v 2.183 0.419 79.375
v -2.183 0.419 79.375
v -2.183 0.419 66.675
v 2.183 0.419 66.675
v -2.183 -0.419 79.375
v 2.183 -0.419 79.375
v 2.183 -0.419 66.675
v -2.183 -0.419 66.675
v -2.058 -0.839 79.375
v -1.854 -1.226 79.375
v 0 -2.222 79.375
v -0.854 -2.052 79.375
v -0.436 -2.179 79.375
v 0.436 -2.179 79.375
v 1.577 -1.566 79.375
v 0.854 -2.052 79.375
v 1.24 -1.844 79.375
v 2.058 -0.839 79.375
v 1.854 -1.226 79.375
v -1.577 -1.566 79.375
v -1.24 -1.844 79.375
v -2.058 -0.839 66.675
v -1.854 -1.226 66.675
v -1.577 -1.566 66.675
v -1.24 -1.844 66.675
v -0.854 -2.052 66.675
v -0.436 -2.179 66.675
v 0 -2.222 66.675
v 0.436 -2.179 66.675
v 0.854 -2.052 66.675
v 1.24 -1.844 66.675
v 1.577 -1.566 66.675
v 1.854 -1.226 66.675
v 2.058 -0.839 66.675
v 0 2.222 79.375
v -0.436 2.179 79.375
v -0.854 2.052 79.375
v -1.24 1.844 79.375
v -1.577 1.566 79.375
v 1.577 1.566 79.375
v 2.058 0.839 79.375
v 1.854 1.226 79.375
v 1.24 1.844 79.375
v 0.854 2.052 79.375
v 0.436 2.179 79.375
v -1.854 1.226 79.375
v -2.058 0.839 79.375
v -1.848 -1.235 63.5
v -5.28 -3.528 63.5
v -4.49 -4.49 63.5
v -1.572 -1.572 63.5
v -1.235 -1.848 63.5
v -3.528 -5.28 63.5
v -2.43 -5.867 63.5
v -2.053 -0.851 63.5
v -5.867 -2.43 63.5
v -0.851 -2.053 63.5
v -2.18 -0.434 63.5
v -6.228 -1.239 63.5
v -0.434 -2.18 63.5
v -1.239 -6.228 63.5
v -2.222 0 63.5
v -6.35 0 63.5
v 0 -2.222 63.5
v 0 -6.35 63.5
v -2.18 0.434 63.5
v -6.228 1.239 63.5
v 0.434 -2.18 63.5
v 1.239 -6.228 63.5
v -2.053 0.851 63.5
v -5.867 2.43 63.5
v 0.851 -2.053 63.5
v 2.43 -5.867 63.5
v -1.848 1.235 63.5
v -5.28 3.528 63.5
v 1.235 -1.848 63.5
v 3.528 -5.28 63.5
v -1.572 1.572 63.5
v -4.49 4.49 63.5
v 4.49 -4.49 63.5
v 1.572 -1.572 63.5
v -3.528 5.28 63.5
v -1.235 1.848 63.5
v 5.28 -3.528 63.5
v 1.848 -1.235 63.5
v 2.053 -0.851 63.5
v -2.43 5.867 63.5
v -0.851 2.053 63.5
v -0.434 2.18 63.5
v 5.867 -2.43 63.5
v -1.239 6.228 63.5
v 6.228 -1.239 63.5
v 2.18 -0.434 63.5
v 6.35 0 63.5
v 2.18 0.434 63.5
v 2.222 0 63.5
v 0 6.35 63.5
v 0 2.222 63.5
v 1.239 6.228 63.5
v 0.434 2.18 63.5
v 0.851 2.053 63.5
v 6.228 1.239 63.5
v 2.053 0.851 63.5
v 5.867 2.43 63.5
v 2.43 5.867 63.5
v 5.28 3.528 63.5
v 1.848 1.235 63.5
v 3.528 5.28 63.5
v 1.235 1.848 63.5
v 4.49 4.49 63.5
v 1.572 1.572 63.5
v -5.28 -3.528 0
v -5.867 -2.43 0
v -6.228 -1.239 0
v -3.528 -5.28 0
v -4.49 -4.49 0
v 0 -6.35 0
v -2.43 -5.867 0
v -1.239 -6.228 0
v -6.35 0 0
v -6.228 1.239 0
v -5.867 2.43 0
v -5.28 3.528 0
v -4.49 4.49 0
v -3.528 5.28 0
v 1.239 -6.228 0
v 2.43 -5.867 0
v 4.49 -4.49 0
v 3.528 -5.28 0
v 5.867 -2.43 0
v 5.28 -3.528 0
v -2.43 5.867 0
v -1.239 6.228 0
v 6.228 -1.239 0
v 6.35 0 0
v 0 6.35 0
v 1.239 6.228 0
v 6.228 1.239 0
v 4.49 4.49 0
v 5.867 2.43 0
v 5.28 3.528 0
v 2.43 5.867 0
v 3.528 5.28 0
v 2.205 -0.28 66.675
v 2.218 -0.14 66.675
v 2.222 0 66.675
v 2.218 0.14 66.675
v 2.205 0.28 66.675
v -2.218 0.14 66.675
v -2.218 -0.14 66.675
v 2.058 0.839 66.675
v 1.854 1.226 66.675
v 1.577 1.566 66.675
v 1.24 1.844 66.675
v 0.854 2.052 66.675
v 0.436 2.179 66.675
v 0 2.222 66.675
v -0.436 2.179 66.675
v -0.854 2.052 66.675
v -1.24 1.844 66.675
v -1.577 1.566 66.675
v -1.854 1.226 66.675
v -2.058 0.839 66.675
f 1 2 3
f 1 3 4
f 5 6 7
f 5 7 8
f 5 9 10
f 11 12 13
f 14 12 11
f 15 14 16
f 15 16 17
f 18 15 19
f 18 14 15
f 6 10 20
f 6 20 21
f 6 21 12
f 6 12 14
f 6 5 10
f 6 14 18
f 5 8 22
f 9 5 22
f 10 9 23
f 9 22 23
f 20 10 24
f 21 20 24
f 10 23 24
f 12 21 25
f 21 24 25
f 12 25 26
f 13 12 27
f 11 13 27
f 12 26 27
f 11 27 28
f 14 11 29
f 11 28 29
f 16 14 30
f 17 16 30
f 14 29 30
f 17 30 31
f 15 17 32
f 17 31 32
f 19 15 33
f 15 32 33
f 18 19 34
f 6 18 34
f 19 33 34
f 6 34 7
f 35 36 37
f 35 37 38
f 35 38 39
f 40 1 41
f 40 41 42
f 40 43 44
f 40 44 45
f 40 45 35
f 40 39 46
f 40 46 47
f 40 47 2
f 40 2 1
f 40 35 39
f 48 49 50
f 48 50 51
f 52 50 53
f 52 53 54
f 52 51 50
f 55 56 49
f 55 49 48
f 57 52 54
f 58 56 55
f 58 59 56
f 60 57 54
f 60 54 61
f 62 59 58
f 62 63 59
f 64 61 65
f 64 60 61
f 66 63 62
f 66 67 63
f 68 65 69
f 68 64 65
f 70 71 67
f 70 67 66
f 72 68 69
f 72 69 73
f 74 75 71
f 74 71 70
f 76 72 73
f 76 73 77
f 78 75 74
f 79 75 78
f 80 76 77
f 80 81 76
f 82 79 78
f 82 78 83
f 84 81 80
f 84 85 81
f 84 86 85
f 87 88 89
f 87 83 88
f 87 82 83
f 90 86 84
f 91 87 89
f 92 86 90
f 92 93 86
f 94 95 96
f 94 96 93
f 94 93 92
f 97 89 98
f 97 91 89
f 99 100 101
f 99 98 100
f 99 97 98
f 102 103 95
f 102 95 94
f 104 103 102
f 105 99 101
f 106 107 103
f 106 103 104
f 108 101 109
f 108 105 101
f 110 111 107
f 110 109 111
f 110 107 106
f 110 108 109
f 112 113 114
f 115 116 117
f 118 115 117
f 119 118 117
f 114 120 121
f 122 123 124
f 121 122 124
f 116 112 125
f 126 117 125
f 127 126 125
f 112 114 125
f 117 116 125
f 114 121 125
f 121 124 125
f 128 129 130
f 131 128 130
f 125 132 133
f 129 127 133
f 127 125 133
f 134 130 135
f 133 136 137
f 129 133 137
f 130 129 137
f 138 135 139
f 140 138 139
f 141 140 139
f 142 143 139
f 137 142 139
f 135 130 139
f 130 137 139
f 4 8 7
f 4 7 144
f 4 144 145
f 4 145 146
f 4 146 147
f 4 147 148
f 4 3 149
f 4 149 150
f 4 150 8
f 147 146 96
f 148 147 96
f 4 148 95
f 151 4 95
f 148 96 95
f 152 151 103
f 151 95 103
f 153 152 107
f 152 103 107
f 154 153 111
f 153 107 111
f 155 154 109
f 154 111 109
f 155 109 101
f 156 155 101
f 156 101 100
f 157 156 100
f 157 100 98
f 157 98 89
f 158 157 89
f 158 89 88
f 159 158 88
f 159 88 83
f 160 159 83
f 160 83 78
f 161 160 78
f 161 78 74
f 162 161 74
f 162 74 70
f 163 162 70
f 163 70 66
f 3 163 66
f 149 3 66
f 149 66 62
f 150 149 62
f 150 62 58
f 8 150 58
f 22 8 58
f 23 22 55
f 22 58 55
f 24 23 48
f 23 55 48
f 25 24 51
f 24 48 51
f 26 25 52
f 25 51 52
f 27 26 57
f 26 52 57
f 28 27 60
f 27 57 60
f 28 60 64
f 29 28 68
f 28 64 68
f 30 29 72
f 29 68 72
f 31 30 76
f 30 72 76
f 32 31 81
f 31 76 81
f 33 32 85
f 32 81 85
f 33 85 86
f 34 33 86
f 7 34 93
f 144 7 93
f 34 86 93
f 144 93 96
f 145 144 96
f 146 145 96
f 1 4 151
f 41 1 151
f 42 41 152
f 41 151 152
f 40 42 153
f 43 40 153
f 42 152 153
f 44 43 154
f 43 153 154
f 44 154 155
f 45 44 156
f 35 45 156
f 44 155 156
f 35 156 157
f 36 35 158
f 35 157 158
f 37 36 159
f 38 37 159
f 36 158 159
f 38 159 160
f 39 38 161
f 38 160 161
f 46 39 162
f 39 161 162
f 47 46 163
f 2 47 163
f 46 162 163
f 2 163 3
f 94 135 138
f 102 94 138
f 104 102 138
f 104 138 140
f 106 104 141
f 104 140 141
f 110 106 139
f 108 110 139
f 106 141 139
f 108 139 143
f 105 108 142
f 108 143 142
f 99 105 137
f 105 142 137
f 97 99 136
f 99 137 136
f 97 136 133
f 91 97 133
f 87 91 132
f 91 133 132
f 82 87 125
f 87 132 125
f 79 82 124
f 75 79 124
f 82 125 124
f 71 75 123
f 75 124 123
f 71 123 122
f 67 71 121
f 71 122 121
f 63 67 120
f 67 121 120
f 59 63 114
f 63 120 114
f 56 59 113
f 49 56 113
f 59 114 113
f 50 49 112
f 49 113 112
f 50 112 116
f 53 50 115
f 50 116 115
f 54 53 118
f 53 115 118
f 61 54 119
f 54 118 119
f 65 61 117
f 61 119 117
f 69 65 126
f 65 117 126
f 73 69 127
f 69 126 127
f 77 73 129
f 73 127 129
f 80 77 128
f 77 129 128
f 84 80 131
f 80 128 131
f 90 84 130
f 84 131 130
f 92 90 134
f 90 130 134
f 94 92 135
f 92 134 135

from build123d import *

# Parameters (mm, degrees)
F0_R     = 6.35
F1_DEPTH = 63.5
F2_R     = 2.2225
F3_DEPTH = 3.175
F5_DEPTH = 12.7


with BuildPart() as f1:
    # F0 (on Top) → F1 (new body)
    with BuildSketch(Plane.XY):
        Circle(F0_R)
    extrude(amount=F1_DEPTH)

    # F2 (on face) → F3 (join)
    with BuildSketch(Plane.XY.offset(63.5)):
        Circle(F2_R)
    extrude(amount=F3_DEPTH)

    # F4 (on face) → F5 (join)
    with BuildSketch(Plane.XY.offset(66.675)):
        with BuildLine():
            ThreePointArc((-2.182627, -0.4191), (0, -2.2225), (2.182627, -0.4191))
            Line((2.182627, -0.4191), (-2.182627, -0.4191))
        make_face()
        with BuildLine():
            ThreePointArc((2.182627, 0.4191), (0, 2.2225), (-2.182627, 0.4191))
            Line((-2.182627, 0.4191), (2.182627, 0.4191))
        make_face()
    extrude(amount=F5_DEPTH)


solid = f1.part
